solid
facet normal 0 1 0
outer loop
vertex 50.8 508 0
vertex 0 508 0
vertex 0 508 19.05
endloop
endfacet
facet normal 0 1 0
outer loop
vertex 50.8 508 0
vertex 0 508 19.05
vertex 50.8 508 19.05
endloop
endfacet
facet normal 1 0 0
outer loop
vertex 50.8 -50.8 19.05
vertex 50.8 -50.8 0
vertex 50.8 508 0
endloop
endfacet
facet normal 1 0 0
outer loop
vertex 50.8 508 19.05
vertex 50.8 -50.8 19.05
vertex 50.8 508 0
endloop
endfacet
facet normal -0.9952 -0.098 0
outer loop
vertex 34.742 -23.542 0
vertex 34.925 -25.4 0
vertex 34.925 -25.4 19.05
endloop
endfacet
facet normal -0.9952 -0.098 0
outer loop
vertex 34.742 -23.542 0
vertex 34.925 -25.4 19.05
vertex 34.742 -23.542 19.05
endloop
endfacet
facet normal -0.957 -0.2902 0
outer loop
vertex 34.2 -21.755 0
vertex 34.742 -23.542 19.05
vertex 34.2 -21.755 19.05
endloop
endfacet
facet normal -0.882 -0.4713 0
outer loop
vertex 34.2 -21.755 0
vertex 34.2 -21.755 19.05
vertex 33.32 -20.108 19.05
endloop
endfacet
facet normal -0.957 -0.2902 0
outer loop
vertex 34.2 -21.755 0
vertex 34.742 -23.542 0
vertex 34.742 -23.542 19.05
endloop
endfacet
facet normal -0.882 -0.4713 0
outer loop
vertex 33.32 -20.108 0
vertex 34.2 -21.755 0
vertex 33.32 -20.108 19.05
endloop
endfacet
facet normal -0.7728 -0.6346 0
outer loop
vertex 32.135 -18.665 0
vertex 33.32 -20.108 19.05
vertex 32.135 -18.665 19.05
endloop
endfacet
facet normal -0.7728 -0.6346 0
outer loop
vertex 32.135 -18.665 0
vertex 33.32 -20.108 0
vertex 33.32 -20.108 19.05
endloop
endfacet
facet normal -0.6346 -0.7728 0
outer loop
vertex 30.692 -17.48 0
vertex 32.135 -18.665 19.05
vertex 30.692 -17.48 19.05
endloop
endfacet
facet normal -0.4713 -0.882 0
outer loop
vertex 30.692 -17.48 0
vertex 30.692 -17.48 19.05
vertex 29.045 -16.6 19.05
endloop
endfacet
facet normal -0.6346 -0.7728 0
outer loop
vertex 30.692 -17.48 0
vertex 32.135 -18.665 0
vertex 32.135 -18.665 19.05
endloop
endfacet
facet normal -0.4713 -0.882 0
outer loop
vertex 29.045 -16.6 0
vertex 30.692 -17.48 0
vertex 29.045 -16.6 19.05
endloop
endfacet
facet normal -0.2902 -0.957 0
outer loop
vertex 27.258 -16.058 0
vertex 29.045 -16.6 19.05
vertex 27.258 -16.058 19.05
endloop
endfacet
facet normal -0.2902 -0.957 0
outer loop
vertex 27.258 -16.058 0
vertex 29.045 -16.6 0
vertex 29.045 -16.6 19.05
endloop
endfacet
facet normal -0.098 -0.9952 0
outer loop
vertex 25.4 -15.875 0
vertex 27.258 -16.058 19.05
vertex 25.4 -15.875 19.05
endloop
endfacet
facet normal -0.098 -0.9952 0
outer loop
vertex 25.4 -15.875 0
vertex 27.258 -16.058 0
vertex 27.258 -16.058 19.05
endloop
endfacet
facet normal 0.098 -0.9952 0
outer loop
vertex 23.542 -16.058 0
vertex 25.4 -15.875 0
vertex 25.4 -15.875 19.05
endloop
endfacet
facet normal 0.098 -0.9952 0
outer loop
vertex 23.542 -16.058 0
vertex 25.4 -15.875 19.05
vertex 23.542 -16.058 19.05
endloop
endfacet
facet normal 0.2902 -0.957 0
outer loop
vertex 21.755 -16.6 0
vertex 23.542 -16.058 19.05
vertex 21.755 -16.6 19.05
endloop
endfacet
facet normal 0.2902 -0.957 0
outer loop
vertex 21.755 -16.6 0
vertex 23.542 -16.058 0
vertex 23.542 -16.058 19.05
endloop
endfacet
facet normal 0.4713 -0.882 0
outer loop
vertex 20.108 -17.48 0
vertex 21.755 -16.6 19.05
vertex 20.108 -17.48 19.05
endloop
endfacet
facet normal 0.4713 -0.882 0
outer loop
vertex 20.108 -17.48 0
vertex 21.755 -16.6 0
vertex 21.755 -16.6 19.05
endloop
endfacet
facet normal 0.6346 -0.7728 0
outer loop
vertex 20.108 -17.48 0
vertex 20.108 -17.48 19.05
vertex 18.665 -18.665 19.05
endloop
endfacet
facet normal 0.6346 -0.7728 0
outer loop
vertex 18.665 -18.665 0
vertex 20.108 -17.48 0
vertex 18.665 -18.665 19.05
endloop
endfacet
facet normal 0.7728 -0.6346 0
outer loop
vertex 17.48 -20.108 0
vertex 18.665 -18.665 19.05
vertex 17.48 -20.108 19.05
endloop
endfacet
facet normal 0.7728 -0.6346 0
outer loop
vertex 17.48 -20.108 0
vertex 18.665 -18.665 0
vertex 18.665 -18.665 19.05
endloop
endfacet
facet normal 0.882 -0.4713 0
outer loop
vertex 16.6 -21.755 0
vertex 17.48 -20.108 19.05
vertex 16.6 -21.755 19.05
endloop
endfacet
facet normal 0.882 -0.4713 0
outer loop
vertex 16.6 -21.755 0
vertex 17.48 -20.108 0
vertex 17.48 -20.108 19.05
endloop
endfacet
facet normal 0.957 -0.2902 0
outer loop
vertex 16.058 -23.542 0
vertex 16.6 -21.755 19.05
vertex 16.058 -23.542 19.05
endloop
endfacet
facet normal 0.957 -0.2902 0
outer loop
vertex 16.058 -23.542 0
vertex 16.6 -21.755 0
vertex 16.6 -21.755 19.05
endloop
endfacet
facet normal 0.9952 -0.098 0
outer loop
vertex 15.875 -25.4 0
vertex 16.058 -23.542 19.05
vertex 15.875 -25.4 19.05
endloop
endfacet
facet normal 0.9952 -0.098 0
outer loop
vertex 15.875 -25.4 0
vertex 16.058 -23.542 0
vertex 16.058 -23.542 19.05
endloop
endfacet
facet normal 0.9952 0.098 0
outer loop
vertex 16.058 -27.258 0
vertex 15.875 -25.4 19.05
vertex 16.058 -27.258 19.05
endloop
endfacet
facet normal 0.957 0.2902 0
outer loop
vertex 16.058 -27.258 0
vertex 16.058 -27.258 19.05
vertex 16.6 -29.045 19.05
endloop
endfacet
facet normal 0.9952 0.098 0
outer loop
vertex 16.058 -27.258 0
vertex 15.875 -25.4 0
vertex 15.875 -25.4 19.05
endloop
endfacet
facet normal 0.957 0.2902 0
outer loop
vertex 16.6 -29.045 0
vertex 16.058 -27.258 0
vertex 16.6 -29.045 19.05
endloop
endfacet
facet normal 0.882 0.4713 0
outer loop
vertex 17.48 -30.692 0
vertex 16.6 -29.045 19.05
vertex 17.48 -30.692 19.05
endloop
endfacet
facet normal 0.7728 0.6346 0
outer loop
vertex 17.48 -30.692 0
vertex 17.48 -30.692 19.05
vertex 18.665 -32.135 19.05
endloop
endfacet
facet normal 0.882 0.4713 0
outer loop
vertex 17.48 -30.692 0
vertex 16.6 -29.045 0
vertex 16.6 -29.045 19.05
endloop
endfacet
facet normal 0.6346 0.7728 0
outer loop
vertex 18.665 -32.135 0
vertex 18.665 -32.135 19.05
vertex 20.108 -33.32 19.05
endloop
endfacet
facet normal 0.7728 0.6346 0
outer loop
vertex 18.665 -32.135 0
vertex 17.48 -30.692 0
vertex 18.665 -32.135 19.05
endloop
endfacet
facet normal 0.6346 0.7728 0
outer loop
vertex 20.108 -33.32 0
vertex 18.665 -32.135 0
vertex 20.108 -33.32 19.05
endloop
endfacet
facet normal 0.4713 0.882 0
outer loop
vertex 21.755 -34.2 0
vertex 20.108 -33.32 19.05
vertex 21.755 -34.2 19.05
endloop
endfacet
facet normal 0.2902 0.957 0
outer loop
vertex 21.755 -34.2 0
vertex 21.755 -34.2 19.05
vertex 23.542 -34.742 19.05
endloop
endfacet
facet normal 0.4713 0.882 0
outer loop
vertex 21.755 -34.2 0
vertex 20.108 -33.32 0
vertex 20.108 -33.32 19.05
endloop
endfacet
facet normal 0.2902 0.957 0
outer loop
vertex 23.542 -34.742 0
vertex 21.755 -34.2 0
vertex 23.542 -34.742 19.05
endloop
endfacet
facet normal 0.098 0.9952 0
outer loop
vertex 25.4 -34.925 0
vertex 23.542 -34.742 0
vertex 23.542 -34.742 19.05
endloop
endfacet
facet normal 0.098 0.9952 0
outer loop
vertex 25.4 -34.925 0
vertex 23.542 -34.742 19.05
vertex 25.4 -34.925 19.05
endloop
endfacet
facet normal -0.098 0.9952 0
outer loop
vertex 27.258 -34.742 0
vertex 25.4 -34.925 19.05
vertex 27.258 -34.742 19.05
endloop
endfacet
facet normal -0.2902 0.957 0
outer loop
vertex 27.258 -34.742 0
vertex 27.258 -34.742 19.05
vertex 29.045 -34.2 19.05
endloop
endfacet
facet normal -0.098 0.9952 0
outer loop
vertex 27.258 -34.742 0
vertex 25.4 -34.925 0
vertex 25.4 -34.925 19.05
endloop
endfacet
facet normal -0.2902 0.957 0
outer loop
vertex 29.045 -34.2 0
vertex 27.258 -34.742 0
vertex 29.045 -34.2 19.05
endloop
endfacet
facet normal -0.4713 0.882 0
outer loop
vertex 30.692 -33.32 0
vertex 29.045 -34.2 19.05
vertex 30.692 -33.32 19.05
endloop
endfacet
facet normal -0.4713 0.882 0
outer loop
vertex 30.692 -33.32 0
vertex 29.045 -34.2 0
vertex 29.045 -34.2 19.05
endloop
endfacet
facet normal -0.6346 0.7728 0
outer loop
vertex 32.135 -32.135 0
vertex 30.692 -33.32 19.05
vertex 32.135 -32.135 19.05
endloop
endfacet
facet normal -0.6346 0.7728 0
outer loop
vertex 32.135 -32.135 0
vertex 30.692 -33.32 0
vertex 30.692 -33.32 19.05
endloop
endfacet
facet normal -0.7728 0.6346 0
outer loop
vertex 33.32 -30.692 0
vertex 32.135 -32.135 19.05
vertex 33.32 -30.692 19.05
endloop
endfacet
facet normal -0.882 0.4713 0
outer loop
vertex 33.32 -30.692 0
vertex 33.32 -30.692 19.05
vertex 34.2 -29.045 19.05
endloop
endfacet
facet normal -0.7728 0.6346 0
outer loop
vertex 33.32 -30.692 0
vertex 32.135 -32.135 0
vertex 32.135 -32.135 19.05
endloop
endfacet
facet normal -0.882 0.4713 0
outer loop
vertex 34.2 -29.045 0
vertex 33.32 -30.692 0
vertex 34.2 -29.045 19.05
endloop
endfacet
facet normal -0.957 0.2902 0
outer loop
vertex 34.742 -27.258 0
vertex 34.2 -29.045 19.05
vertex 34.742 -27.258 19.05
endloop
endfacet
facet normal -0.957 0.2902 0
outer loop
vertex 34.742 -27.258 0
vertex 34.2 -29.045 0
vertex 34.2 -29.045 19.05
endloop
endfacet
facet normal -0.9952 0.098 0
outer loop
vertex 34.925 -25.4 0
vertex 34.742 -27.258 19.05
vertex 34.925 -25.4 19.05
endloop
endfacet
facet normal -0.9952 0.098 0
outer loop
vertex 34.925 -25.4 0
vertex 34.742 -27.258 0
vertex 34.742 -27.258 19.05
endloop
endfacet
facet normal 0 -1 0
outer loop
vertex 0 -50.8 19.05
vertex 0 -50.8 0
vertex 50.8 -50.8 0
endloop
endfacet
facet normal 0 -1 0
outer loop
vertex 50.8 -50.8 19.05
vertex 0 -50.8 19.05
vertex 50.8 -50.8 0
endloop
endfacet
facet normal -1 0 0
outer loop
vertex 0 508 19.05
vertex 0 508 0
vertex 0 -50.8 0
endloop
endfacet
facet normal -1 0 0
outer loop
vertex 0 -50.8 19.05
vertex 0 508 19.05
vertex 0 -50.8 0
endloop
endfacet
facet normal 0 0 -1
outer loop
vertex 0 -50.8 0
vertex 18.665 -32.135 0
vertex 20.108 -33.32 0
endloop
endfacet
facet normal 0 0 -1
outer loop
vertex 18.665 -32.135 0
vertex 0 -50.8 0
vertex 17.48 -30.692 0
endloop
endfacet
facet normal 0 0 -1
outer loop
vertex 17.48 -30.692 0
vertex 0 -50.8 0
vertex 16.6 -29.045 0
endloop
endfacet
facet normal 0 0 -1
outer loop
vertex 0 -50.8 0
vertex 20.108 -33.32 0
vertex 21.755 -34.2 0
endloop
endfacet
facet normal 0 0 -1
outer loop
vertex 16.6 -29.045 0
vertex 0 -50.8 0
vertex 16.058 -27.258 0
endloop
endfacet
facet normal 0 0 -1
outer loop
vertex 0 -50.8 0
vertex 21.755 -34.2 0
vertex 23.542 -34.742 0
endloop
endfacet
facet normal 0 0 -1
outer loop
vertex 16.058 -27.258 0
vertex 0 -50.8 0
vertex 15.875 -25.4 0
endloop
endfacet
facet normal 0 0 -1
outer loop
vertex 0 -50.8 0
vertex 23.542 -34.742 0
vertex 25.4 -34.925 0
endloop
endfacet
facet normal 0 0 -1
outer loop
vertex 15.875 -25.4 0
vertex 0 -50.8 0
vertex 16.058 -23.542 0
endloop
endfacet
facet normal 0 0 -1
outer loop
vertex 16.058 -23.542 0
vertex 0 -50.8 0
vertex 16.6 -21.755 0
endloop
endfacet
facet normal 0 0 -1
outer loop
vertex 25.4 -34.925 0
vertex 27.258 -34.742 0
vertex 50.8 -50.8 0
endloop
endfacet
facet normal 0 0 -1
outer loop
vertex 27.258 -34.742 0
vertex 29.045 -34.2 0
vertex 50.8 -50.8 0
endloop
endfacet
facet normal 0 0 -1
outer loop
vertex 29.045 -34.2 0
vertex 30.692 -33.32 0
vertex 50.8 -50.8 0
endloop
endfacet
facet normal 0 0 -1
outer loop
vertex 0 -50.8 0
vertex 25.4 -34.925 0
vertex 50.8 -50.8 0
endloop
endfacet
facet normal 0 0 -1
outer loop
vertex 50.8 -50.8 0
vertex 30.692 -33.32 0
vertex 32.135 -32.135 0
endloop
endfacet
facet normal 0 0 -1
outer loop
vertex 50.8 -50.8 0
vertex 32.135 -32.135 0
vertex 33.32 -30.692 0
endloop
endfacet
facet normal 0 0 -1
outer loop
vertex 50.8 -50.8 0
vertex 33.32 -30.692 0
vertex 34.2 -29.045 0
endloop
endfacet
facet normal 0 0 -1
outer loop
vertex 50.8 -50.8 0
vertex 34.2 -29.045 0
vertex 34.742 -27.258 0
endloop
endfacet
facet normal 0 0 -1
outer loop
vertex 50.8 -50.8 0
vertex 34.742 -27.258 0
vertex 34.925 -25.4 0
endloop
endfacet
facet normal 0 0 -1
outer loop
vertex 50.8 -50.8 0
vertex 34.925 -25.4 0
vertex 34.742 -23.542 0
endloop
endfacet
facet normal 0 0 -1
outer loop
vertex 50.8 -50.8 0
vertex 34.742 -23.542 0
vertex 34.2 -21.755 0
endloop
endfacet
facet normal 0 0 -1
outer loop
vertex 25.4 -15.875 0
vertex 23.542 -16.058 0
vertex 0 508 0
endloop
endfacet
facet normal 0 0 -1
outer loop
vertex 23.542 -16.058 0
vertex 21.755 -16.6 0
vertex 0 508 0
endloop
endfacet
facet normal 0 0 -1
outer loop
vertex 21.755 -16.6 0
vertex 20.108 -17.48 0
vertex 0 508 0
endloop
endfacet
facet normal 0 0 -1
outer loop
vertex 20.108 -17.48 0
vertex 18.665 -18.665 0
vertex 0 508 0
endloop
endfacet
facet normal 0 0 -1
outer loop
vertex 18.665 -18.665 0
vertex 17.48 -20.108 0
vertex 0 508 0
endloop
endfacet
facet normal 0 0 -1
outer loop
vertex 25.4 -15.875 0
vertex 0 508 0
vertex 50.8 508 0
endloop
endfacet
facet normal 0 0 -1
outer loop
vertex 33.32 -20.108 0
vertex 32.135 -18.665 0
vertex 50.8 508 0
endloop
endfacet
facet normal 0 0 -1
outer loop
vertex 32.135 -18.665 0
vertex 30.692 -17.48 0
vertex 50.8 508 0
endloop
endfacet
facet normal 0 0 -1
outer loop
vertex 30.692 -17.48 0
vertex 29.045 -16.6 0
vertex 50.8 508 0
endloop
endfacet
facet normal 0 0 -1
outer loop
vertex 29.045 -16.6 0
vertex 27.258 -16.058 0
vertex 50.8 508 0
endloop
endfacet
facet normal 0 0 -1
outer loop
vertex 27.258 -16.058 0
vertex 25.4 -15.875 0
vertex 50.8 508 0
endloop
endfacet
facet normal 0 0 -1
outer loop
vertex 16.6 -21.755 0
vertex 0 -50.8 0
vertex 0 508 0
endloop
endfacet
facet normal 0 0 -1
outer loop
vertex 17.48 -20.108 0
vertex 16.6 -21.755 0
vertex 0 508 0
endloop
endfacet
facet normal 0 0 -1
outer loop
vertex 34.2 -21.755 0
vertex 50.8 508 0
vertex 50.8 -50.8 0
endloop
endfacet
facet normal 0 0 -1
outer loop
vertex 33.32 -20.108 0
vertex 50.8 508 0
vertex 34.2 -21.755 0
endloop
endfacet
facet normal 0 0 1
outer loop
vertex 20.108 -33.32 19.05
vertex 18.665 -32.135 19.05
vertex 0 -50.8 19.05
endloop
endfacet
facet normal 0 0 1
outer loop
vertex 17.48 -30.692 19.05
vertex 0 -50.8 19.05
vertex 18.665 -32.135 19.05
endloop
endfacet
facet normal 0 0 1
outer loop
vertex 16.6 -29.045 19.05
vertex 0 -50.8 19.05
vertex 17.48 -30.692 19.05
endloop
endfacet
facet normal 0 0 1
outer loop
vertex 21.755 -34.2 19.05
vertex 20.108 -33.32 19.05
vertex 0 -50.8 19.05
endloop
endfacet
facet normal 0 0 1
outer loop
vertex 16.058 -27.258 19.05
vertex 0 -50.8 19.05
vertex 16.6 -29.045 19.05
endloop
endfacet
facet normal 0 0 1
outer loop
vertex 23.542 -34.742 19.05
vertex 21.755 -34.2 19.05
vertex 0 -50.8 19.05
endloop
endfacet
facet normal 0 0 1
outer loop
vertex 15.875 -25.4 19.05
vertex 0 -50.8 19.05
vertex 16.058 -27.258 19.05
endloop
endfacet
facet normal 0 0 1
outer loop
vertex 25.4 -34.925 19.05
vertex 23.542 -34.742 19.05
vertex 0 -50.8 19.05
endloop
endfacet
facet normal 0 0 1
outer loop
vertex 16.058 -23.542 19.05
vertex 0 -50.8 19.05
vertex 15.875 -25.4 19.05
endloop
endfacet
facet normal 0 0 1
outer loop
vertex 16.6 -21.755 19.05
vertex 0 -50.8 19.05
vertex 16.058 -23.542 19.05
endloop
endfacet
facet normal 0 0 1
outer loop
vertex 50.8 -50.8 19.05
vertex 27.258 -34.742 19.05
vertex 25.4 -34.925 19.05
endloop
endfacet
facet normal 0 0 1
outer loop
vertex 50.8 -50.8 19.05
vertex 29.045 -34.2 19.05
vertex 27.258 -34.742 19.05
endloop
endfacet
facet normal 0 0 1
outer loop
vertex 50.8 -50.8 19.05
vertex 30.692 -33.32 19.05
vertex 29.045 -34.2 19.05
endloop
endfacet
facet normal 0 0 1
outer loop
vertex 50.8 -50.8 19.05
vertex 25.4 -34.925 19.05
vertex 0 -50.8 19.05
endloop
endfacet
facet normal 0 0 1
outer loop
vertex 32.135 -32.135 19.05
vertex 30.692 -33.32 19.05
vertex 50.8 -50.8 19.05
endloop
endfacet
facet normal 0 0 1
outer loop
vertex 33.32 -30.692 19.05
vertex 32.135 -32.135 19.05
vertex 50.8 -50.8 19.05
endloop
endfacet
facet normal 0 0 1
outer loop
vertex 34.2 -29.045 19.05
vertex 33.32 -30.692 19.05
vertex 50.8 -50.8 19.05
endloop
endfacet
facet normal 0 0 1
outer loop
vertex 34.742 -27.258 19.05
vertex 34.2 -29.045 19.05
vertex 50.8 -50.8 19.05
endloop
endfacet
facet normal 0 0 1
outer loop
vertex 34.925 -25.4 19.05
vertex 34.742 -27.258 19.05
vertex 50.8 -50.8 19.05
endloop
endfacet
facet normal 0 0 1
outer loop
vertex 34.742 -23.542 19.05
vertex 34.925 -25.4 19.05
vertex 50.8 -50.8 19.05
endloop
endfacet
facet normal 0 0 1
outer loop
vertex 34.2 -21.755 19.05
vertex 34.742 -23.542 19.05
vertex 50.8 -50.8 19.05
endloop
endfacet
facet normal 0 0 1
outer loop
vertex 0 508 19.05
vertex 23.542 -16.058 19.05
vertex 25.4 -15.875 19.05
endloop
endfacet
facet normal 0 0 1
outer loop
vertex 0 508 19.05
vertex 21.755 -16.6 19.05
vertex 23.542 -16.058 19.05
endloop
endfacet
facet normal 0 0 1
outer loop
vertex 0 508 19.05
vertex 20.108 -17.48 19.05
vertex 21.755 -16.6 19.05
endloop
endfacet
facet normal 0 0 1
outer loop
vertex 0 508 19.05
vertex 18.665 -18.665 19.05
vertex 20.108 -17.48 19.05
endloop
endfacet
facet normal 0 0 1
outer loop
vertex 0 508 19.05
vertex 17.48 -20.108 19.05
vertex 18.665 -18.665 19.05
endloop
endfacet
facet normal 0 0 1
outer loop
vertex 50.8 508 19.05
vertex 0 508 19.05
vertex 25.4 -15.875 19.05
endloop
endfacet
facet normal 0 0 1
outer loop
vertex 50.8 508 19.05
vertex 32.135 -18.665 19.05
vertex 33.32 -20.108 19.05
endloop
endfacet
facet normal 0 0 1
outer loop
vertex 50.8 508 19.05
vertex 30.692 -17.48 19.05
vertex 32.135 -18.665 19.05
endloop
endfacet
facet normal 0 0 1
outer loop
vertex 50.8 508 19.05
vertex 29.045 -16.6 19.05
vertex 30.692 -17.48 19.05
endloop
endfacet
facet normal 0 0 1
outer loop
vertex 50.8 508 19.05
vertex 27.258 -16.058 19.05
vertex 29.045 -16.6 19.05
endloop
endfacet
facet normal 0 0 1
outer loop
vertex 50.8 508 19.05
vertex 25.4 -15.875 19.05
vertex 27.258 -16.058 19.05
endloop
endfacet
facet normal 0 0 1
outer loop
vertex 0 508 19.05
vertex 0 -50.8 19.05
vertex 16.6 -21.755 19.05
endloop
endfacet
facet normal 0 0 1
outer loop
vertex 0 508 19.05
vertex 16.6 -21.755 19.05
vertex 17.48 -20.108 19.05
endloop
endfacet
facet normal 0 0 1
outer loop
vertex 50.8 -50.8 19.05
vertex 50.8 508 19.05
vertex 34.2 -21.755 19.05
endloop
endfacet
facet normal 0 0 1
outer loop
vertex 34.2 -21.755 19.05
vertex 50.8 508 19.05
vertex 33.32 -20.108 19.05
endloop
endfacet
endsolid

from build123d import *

# Parameters (mm, degrees)
F0_W     = 50.8
F0_H     = 508
F0_H_2   = 50.8
F0_R     = 9.525
F1_DEPTH = 19.05


with BuildPart() as f1:
    # F0 (on Top) → F1 (new body)
    with BuildSketch(Plane.XY):
        with Locations((25.4, 254)):
            Rectangle(F0_W, F0_H)
        with Locations((25.4, -25.4)):
            Rectangle(F0_W, F0_H_2)
        with Locations((25.4, -25.4)):
            Circle(F0_R, mode=Mode.SUBTRACT)
    extrude(amount=F1_DEPTH)


solid = f1.part
